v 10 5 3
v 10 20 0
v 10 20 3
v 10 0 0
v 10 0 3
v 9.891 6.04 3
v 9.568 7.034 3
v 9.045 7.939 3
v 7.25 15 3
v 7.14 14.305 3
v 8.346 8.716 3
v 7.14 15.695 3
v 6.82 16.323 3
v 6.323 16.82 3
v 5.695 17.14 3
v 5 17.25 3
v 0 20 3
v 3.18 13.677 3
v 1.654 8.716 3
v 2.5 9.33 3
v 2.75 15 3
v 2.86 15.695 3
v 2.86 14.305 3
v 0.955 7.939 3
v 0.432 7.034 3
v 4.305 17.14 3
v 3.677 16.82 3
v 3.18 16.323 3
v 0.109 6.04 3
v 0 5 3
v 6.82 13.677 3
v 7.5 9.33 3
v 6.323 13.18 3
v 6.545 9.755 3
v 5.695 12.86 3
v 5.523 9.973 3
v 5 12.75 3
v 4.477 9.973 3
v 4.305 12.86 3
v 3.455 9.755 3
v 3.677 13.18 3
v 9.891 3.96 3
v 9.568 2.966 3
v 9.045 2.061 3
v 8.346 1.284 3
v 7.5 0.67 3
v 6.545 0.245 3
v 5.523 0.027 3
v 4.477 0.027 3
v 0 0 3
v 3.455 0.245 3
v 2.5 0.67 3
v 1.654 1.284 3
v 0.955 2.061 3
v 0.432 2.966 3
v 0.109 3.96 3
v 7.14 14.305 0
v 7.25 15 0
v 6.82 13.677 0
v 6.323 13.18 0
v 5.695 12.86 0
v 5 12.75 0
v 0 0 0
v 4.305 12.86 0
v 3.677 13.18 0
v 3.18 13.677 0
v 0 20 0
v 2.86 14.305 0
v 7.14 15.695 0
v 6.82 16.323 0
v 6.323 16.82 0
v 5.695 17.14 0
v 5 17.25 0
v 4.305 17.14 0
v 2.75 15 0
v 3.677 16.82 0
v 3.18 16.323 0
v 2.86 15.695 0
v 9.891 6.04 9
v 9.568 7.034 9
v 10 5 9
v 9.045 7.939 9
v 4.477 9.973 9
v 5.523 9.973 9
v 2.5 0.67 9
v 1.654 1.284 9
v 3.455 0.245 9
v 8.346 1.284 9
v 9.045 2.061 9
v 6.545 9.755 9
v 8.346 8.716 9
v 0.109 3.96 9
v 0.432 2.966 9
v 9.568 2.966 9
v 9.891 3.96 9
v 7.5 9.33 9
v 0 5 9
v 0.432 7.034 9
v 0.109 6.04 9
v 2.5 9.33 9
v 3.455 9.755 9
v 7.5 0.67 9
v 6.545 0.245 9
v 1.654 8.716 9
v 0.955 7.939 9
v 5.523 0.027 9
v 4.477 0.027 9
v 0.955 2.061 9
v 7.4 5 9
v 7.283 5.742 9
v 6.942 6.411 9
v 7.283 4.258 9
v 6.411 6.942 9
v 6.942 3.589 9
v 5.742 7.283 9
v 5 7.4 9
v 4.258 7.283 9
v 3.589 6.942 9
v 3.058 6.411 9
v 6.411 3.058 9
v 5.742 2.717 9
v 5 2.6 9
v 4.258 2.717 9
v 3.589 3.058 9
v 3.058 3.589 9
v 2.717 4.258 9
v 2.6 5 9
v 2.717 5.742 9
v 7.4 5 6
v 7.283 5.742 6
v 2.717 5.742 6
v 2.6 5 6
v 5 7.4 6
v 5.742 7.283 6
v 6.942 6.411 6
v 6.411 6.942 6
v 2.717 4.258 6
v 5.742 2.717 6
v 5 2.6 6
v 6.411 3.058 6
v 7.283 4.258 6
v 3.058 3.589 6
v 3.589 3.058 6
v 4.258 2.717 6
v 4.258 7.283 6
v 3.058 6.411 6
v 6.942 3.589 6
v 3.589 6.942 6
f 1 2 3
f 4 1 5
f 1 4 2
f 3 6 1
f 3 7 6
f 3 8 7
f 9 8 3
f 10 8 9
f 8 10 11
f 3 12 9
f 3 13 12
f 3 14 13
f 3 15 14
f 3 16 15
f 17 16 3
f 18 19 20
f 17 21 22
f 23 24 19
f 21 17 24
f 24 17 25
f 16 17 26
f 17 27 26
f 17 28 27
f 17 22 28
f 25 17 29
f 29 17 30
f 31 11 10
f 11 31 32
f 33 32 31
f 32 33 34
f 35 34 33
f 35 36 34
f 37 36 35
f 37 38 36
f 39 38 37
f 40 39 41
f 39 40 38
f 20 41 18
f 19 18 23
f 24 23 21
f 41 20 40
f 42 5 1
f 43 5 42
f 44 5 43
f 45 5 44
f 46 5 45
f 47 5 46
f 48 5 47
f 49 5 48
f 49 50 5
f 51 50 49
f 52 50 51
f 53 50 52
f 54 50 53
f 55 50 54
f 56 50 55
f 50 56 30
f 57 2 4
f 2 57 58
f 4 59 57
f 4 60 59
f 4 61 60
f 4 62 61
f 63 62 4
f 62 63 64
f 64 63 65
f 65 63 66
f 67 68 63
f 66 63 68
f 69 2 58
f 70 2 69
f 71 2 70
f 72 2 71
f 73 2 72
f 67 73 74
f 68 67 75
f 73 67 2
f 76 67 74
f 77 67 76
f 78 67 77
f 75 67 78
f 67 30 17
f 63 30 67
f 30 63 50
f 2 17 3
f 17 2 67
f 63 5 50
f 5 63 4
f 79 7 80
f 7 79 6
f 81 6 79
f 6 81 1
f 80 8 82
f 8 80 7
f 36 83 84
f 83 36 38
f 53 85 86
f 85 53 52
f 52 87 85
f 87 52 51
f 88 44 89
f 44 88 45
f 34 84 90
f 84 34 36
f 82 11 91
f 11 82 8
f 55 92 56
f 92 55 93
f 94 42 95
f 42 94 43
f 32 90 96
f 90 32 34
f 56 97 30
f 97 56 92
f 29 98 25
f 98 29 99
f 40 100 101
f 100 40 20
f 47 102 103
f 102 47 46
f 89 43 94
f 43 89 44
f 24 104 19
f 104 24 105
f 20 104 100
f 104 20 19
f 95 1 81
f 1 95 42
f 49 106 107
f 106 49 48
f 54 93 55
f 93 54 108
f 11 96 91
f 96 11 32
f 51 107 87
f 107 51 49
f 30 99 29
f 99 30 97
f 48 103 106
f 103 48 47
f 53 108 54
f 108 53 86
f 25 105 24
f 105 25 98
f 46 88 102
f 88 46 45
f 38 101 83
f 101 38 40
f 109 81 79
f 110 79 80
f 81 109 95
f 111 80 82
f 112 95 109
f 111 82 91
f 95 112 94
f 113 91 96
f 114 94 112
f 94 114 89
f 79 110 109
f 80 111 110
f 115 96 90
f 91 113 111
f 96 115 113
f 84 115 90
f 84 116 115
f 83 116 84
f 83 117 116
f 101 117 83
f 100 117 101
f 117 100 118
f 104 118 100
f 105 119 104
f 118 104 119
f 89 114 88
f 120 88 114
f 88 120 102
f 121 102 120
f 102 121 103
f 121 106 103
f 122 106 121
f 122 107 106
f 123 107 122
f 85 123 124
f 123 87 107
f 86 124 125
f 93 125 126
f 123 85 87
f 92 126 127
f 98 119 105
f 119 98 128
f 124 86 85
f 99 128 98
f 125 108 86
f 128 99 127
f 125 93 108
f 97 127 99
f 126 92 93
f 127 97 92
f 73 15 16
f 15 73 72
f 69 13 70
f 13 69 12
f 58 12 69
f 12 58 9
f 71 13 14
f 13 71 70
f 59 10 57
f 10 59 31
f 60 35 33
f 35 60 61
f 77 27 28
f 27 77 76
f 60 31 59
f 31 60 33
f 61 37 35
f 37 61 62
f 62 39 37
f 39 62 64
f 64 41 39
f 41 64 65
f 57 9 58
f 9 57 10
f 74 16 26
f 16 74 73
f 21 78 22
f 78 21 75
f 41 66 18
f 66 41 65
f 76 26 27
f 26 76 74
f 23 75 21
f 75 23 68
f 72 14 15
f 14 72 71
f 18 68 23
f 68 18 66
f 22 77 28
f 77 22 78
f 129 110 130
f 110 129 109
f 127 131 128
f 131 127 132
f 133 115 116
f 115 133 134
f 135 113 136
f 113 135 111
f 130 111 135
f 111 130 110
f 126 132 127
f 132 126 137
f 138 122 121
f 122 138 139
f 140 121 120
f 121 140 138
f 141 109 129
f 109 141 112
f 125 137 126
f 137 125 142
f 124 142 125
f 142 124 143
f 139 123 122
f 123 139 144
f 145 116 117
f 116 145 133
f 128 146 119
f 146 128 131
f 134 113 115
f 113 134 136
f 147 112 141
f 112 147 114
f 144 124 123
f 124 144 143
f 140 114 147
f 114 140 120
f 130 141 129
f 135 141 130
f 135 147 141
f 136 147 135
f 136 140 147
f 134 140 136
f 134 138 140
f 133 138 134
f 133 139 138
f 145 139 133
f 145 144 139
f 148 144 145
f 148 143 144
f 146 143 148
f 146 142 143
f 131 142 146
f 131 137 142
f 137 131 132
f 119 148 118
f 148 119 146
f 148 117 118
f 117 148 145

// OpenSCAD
r1 = 31;
w = 3;
h = 20;

module servo(){
    translate([0,-11.75-w,-10])difference(){
        cube([12.5+2*w,23.5+2*w,30]);
        translate([w,w,0])cube([12.5,23.5,30]);
        translate([3+w,23.5+w,0])cube([12.5-2*3,w,10]);
        translate([3,23.5+w-1,0])rotate([0,-45,0])cylinder(r=1,h=5,$fn=15);
        translate([12.5+w-1,3,0])rotate([45,0,0])cylinder(r=1,h=5,$fn=15);
    }
}

module holder(){
    difference(){
        union(){
            cylinder(h=h,r=r1+w,$fn=80);
            translate([4+r1+w,0,h-5])cylinder(r=4,h=5,$fn=20);
            translate([r1+w/2+0.875,0,2.5+h-5])cube([w+1.75,4,5],center=true);
        }
        cylinder(h=h,r=r1,$fn=80);
        translate([4+r1+w,0,h-5])cylinder(r=2.25,h=5,$fn=20);
        translate([0,-4-15,0])cube([r1+w,15,h]);
    }
    rotate([0,0,-60])translate([r1,0,0])servo();
    translate([-3,r1,-10])cube([6,w,10]);
}

module bar1(){
    difference(){
        union(){
            cube([10,20,3]);
            translate([5,5,3])cylinder(r=5,h=6,$fn=30);
        }
        translate([5,15,0])cylinder(h=3,r=2.25,$fn=20);
        translate([5,5,6])cylinder(h=6,r=2.4,$fn=20);
    }
}

module bar2(){
    difference(){
        union(){
            cube([8,44,3]);
            translate([0,25,3])cube([8,19,6]);
        }
        translate([4,4,0])cylinder(h=3,r=2.25,$fn=20);
        translate([4,10,0])cylinder(h=3,r=2.25,$fn=20);
        translate([4,30,0])cylinder(h=9,r=2.25,$fn=20);
        translate([4,39,0])cylinder(h=9,r=2.25,$fn=20);
    }
}
module servoTest(){
    linear_extrude(2)difference(){
        translate([-4,-4])square([65,8]);
        for(i=[0:7]){
            translate([i*8,0])circle(r=2.3+i*0.03,$fn=30);
        }
    }
}



//servo();
bar1();
//translate([12,0,0])bar1();
//holder();
